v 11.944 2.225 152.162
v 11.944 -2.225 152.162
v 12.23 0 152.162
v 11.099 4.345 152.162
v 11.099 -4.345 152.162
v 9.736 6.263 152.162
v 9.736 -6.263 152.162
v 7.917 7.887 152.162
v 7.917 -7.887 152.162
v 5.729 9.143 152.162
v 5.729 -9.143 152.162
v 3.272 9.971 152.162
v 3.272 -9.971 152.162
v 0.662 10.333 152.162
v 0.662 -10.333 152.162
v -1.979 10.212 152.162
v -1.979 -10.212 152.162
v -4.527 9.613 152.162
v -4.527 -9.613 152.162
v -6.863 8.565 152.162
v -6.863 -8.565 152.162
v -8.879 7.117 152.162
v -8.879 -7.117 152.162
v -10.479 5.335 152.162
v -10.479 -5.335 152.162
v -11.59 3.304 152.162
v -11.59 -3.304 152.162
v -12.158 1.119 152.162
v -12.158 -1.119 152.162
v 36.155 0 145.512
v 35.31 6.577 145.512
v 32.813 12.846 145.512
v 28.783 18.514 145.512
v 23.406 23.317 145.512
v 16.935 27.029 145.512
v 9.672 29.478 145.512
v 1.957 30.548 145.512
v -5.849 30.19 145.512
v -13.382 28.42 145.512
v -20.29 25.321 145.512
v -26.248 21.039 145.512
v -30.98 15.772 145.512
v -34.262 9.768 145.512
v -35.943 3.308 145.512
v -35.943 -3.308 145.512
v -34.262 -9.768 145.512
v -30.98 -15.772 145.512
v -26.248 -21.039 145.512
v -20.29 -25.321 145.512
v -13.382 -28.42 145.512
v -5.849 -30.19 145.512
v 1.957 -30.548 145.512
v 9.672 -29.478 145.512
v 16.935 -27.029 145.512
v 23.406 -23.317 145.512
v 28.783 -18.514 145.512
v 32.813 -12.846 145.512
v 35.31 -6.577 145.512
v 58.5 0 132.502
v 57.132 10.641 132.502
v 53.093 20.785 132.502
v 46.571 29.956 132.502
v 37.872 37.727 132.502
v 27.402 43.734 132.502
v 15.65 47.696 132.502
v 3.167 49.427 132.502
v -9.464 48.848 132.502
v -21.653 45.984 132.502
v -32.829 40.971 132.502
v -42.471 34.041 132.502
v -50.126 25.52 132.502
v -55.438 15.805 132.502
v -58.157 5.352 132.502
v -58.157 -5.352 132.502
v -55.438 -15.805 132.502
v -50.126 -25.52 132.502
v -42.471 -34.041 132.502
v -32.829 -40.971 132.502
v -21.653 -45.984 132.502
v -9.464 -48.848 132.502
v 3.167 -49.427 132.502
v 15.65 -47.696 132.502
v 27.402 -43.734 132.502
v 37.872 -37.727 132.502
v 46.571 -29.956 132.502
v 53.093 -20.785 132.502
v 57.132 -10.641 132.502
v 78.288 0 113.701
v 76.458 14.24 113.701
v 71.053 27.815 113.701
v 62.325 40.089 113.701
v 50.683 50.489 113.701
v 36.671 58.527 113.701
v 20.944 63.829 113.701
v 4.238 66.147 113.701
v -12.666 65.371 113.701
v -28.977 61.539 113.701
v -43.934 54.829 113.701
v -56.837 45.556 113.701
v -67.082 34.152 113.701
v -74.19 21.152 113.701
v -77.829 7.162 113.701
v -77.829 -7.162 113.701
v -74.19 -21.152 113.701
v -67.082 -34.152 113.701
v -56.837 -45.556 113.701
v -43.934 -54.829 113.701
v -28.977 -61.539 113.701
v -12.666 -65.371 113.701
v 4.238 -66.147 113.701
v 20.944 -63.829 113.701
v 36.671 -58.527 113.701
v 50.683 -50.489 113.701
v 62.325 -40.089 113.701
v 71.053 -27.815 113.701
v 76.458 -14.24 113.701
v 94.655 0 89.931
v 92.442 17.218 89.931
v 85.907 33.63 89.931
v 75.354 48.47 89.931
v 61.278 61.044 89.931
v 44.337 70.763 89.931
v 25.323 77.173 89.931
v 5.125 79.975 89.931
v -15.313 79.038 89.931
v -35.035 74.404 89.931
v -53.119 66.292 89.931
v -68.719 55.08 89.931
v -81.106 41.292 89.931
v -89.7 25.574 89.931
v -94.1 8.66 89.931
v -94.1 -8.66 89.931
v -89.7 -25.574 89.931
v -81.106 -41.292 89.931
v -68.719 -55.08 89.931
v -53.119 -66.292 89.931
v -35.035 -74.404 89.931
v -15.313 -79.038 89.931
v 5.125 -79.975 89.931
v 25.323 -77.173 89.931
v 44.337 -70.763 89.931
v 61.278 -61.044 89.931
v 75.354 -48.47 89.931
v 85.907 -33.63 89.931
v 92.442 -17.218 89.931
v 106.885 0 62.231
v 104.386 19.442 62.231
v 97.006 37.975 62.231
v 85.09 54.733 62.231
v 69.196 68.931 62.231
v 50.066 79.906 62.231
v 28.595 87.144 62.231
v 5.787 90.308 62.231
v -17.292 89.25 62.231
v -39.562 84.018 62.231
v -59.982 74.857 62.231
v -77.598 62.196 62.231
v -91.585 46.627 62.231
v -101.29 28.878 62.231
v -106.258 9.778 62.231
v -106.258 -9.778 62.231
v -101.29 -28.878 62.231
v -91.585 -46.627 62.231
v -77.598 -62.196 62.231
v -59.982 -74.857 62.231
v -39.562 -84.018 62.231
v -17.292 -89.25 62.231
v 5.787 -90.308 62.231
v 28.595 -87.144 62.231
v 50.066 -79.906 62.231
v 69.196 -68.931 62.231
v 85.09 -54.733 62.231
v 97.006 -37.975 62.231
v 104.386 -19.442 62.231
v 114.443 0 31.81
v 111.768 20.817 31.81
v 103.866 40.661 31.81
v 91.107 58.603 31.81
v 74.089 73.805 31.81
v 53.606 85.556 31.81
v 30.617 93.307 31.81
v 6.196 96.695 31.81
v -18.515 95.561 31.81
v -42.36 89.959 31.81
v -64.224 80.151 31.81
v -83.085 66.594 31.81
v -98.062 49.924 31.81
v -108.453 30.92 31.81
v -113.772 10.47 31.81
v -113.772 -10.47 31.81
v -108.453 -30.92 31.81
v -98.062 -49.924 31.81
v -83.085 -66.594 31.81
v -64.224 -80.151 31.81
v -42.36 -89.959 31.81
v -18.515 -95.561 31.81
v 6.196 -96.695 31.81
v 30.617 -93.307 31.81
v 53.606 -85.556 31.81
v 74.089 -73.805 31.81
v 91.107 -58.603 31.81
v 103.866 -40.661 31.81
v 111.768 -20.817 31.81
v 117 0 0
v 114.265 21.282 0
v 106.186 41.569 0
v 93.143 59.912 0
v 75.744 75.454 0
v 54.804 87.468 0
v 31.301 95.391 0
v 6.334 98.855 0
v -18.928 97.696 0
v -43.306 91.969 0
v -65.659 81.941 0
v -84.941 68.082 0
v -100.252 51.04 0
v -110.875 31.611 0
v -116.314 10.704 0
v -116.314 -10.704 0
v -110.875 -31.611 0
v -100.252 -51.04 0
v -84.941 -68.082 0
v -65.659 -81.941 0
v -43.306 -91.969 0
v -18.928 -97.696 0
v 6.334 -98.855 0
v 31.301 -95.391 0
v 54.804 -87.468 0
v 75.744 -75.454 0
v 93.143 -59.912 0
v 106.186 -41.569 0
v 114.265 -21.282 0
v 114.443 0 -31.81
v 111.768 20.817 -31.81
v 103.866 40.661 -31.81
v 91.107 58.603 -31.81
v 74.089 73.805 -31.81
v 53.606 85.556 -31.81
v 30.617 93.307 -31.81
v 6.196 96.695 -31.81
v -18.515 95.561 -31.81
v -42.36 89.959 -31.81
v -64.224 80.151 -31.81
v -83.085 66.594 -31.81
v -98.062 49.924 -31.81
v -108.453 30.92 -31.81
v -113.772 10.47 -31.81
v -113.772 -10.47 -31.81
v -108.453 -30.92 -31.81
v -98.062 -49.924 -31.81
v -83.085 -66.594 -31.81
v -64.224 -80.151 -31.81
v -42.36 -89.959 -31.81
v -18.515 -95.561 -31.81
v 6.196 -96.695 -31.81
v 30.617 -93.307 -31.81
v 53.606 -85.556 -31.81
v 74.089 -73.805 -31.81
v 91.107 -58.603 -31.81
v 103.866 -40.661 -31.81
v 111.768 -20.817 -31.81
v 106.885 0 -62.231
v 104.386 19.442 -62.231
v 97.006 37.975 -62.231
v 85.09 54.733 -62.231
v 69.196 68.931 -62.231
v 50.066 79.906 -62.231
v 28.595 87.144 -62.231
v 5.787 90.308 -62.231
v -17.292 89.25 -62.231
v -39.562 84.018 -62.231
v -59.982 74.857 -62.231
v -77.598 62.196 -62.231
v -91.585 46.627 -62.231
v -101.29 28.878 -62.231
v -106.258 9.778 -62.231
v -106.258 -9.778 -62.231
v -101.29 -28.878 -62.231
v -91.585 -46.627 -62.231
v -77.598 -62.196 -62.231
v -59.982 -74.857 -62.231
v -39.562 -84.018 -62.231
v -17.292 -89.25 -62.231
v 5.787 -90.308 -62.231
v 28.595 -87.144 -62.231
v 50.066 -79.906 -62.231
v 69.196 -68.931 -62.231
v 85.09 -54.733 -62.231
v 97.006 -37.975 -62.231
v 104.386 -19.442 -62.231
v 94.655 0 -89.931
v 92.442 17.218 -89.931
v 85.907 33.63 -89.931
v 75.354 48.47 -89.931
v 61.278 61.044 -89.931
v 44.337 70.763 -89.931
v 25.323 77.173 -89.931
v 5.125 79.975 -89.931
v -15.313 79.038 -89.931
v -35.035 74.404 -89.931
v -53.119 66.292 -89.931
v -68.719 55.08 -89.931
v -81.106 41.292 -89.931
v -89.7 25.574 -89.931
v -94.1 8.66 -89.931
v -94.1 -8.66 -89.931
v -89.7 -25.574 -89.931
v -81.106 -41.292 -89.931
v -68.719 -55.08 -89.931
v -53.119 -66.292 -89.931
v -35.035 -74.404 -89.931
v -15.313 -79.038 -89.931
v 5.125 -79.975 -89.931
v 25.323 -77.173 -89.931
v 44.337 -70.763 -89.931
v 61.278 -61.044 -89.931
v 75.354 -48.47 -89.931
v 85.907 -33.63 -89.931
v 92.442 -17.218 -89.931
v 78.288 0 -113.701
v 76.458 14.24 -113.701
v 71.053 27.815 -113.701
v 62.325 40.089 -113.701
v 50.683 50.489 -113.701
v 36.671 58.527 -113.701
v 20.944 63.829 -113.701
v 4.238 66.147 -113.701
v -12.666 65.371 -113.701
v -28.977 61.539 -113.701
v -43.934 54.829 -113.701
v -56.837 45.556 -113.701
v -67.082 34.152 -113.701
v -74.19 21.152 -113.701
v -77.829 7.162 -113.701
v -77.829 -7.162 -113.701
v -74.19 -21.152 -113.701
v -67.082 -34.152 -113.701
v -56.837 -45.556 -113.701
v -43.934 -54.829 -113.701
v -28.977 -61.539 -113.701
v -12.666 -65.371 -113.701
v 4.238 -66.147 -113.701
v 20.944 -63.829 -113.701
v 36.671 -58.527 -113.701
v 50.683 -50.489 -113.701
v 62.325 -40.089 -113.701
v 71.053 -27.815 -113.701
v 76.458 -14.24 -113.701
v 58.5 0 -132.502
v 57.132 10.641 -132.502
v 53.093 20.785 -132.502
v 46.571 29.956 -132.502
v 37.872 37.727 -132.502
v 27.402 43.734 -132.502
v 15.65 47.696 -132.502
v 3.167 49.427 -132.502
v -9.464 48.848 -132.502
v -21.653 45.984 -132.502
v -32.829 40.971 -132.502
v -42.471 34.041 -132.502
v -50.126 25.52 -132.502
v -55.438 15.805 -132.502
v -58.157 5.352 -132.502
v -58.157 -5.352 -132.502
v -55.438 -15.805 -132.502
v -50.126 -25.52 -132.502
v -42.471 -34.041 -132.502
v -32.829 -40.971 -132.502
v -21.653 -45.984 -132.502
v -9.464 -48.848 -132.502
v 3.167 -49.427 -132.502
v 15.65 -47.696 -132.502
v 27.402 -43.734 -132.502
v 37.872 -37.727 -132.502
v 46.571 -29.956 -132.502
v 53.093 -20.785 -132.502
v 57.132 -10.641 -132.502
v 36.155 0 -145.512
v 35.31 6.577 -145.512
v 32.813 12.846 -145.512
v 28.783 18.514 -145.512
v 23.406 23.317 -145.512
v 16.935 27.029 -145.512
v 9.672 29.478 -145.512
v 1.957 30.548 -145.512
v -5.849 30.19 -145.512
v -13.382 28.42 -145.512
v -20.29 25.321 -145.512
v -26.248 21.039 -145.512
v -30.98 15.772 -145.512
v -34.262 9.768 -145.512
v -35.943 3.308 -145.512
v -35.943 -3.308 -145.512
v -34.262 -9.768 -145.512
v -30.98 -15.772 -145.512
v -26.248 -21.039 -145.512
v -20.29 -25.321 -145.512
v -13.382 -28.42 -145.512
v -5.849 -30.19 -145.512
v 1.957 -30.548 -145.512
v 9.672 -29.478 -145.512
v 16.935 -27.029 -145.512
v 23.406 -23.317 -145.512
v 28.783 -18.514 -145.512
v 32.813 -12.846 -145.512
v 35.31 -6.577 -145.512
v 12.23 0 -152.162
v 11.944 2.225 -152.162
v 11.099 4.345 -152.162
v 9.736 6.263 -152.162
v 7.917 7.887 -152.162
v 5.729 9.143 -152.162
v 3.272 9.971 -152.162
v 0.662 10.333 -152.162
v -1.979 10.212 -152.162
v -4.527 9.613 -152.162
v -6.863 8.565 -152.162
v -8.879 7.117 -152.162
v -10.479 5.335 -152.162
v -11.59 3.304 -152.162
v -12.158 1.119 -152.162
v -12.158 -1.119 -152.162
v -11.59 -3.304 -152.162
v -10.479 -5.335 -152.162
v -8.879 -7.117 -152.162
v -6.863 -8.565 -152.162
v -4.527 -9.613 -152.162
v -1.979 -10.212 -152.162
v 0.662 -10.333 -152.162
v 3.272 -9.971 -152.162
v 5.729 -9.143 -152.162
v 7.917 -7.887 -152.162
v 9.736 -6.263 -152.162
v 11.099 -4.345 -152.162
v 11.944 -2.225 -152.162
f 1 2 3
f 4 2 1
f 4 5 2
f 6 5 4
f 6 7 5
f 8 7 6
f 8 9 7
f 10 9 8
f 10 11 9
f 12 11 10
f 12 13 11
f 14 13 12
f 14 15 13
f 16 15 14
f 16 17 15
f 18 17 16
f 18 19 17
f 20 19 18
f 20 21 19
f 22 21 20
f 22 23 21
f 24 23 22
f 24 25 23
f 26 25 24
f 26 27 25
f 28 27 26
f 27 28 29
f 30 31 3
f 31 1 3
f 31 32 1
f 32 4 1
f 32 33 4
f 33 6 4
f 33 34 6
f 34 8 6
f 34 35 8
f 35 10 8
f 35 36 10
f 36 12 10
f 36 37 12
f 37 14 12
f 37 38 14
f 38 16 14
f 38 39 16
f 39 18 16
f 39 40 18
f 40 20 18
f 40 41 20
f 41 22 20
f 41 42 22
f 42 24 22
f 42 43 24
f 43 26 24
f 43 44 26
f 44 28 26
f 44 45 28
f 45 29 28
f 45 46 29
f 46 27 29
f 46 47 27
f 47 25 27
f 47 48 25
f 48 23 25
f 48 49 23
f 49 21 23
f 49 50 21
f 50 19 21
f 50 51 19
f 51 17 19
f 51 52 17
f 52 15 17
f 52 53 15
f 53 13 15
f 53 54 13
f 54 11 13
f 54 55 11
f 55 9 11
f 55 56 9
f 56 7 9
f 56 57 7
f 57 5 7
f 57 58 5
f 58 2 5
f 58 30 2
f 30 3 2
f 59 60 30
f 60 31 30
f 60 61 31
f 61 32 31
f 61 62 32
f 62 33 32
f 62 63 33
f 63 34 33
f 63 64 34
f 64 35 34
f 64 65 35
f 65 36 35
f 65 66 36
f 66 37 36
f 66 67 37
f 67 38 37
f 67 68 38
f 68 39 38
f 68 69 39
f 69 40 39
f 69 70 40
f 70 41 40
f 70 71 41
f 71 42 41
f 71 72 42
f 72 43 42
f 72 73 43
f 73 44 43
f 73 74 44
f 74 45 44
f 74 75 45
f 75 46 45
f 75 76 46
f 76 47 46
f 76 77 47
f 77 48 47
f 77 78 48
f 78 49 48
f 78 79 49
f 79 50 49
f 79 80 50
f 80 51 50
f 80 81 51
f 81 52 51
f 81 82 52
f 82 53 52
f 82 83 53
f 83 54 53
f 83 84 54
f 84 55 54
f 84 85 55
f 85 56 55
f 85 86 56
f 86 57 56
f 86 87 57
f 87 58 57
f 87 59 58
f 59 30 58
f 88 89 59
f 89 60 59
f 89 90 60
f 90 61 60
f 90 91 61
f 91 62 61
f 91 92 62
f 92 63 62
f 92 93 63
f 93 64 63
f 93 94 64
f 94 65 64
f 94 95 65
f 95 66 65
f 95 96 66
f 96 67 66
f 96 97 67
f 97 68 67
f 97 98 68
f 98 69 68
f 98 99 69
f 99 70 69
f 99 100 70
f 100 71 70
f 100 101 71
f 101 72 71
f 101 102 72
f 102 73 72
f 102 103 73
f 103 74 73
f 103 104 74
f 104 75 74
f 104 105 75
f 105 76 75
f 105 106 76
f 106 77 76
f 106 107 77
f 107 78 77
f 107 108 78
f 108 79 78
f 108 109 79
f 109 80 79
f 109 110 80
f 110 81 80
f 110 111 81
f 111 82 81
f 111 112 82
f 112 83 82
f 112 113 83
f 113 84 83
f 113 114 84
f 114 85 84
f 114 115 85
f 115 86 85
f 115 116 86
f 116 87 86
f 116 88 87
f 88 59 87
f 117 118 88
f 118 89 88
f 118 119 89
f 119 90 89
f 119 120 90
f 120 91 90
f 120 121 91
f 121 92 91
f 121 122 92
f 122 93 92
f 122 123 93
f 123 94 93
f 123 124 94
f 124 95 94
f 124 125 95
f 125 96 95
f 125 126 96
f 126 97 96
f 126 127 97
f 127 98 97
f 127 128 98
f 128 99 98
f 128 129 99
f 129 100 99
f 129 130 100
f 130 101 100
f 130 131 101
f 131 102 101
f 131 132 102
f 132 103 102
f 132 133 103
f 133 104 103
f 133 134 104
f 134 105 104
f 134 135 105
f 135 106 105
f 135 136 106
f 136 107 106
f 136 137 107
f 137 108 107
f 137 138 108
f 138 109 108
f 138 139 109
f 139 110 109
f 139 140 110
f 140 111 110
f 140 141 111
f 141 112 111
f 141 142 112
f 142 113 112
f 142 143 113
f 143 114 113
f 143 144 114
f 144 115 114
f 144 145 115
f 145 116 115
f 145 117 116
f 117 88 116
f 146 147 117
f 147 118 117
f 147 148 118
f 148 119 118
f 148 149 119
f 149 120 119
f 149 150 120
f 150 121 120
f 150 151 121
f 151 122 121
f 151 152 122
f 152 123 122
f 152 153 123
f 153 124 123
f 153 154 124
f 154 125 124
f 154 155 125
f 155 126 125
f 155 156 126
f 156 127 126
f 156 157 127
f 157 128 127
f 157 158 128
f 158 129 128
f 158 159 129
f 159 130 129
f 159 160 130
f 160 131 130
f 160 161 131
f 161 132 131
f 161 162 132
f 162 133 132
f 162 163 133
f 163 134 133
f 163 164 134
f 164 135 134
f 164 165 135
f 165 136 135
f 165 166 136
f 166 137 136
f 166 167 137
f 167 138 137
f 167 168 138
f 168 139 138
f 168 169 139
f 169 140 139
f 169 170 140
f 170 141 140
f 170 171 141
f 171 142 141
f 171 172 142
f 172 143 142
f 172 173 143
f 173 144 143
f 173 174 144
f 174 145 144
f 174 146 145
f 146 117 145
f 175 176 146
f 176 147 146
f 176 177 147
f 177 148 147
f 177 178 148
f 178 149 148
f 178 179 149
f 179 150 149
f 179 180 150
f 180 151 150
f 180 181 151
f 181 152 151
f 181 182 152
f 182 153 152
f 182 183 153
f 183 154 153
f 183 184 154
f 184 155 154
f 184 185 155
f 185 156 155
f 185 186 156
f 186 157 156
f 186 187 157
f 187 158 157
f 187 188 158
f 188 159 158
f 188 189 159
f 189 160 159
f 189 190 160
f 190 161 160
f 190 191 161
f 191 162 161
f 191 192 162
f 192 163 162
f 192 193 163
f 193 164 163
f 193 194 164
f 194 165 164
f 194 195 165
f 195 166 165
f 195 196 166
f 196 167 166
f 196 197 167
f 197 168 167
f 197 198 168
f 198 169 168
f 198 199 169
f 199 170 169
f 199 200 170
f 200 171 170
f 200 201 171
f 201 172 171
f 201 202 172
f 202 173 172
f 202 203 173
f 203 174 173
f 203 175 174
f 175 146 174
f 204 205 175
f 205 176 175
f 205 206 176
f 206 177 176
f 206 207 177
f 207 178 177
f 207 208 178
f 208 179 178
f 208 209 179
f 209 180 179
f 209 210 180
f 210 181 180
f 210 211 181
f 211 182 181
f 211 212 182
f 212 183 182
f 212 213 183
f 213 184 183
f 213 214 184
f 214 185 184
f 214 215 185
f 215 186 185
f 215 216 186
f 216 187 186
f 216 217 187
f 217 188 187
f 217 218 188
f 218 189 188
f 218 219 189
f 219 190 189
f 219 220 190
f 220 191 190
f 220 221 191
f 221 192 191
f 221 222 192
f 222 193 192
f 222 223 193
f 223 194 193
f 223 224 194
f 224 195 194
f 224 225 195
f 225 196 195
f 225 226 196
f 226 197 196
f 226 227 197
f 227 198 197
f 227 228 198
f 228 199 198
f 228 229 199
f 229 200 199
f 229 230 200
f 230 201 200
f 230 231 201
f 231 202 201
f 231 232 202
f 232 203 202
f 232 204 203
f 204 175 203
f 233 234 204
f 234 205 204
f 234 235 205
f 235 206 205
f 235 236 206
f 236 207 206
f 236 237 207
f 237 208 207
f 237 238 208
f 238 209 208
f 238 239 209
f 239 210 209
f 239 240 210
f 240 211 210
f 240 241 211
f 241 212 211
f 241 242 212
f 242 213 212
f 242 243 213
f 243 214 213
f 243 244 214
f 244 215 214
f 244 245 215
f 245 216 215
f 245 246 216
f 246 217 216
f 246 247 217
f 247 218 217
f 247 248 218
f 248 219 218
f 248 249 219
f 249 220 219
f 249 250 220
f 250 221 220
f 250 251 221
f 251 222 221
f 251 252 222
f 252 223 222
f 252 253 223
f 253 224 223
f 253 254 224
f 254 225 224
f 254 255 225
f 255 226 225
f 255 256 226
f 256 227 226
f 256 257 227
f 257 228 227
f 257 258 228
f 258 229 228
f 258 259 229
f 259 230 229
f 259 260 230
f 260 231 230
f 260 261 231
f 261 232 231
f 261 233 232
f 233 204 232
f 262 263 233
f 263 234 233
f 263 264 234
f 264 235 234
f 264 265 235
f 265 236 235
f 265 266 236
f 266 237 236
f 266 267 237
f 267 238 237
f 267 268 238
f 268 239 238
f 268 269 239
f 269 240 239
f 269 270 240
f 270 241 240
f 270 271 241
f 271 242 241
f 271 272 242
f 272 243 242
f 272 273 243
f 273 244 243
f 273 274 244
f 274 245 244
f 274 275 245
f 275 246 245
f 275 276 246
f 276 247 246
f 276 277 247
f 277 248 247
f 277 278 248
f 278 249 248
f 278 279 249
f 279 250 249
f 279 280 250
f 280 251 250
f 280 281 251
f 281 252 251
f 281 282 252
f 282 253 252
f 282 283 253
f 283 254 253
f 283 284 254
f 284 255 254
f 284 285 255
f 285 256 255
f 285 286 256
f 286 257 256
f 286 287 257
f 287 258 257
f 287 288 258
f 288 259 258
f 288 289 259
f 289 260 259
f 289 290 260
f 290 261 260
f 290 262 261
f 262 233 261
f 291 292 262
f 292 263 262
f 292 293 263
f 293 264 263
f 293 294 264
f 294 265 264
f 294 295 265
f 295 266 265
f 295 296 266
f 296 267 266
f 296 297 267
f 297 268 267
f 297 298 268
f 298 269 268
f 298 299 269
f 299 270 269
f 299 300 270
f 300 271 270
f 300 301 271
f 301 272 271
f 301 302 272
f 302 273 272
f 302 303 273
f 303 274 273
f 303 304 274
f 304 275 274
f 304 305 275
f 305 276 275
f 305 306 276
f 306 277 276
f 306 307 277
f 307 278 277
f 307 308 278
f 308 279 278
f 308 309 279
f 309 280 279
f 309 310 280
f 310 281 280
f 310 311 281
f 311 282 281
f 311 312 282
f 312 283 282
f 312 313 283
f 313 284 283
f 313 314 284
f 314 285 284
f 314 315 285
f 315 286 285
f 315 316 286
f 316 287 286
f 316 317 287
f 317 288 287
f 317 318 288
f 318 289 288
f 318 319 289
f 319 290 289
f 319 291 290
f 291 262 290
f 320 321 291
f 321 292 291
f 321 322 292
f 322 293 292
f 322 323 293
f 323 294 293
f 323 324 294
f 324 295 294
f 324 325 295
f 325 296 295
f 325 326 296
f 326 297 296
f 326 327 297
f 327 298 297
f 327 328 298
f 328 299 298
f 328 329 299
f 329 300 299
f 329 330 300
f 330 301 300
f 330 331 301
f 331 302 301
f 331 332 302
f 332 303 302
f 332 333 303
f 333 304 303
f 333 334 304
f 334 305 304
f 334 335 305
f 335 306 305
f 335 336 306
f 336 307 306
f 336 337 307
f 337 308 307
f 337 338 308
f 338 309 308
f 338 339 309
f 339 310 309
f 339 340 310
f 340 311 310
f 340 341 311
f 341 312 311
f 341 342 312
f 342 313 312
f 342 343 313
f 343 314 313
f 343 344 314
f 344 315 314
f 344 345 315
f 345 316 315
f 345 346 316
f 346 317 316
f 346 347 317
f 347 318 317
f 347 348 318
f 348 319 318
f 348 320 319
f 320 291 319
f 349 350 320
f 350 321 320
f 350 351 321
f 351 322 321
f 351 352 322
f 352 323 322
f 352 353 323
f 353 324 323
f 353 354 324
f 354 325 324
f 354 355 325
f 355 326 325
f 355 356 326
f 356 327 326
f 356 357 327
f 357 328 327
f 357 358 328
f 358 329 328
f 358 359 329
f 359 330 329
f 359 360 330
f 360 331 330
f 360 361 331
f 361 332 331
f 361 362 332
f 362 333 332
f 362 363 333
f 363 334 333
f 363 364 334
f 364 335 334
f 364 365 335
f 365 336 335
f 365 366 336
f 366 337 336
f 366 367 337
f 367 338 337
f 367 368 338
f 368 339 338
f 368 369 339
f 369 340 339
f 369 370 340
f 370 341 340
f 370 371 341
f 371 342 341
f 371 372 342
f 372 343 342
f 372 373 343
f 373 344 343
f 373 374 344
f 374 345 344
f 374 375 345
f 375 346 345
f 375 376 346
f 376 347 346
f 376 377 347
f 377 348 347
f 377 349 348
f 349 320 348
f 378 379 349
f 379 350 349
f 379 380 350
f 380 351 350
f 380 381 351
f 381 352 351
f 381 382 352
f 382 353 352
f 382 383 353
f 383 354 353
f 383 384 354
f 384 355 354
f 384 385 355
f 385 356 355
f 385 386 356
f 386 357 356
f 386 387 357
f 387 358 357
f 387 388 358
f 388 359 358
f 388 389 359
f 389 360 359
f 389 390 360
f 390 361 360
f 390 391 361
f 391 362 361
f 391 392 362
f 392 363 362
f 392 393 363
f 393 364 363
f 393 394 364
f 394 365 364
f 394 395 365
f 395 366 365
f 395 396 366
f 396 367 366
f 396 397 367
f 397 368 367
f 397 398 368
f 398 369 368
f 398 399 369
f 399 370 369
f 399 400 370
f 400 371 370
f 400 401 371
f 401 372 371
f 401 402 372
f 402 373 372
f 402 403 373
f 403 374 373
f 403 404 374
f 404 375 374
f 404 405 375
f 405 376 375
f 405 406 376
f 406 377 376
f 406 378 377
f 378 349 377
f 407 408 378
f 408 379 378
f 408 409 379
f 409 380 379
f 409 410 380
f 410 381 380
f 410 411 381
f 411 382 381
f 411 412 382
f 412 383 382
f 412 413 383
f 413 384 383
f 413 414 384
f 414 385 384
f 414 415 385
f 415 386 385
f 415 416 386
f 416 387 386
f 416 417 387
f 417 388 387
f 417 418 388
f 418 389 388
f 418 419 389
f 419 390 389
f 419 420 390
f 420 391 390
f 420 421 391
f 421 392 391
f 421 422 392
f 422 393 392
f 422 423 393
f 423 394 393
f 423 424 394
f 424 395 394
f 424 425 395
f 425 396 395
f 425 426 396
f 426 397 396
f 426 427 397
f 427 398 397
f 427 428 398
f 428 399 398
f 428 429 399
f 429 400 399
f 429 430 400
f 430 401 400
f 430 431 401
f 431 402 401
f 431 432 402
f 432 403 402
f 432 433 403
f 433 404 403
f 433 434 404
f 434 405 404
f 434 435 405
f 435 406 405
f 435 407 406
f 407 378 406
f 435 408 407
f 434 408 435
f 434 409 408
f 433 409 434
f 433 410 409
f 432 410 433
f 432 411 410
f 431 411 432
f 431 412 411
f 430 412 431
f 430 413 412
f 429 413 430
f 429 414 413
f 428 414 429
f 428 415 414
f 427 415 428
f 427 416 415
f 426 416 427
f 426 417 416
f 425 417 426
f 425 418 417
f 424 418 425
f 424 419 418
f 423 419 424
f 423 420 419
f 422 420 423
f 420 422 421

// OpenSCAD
// Generated by SolidPython 1.0.1 on 2020-07-29 00:46:51


scale(v = [13, 11, 17]) {
	sphere(r = 9);
}
/***********************************************
*********      SolidPython code:      **********
************************************************
 
# import packages: SolidPython
from solid import *
from solid.utils import *
from itertools import chain, combinations, permutations


class Resize:

    def __init__(self, scad_file):
        self.scad_file = scad_file
        #self.scad_file = import_scad(scad_file)
        # cone/cylinder param:
        self.r1 = 0
        self.r2 = 0
        self.h = 0
        # rectangular prism param:
        self.w = 0
        self.l = 0
        # ellipse param:
        self.r = 0

    # import OpenScad code (file name corresponds to shape)


    # classify shape + parameters
    def assign(self, param1, param2, param3):
        if self.scad_file == 'cone.scad':
            self.r1 = param1
            self.r2 = param2
            self.h = param3
        elif self.scad_file == 'cylinder.scad':
            self.r1 = param1
            self.r2 = param2
            self.h = param3
        elif self.scad_file == 'rectangularPrism.scad':
            self.h = param1
            self.l = param2
            self.w = param3
        else:
            self.r = param1
            self.h = param2

    # resize parameters
    def iterate(self):
        x = range(3, 20, 2)
        i = 1
        if self.scad_file == 'cone.scad':
            tempList = list(permutations(x, 2))
            for temp in tempList:
                param1 = temp[0]
                param2 = temp[1]
                filepath = 'produced_scad_files/' + 'cone' + str(param1) + '_' + str(param2) + '_' + '.scad'
                scad_render_to_file(cylinder(h=param1, r1=param2, r2=0), filepath)

        elif self.scad_file == 'cylinder.scad':
            tempList = list(permutations(x, 3))
            for temp in tempList:
                param1 = temp[0]
                param2 = temp[1]
                filepath = 'produced_scad_files/' + 'cylinder' + str(param1) + '_' + str(param2) + '_' + '.scad'
                scad_render_to_file(cylinder(h=param1, r1=param2, r2=param2), filepath)

        elif self.scad_file == 'rectangularPrism.scad':
            tempList = list(permutations(x, 3))
            for temp in tempList:
                param1 = temp[0]
                param2 = temp[1]
                param3 = temp[2]
                filepath = 'produced_scad_files/' + 'rectangularPrism' + str(param1) + '_' + str(param2) + '_' + str(
                    param3) + '.scad'
                scad_render_to_file(cube(size=(param1, param2, param3)), filepath)

        elif self.scad_file == 'ellipse.scad':
            tempList = list(permutations(x, 4))
            for temp in tempList:
                param1 = temp[0]
                param2 = temp[1]
                param3 = temp[2]
                param4 = temp[3]
                filepath = 'produced_scad_files/' + 'ellipse' + str(param1) + '_' + str(param2) + '_' + str(param3) + '_' + str(param4) + '.scad'
                scad_render_to_file(scale([param1, param2, param3])(sphere(r=param4)), filepath)

    def render_to_scadfile(self):
        scad_render_to_file(scad, 'example.scad') 
 
************************************************/
